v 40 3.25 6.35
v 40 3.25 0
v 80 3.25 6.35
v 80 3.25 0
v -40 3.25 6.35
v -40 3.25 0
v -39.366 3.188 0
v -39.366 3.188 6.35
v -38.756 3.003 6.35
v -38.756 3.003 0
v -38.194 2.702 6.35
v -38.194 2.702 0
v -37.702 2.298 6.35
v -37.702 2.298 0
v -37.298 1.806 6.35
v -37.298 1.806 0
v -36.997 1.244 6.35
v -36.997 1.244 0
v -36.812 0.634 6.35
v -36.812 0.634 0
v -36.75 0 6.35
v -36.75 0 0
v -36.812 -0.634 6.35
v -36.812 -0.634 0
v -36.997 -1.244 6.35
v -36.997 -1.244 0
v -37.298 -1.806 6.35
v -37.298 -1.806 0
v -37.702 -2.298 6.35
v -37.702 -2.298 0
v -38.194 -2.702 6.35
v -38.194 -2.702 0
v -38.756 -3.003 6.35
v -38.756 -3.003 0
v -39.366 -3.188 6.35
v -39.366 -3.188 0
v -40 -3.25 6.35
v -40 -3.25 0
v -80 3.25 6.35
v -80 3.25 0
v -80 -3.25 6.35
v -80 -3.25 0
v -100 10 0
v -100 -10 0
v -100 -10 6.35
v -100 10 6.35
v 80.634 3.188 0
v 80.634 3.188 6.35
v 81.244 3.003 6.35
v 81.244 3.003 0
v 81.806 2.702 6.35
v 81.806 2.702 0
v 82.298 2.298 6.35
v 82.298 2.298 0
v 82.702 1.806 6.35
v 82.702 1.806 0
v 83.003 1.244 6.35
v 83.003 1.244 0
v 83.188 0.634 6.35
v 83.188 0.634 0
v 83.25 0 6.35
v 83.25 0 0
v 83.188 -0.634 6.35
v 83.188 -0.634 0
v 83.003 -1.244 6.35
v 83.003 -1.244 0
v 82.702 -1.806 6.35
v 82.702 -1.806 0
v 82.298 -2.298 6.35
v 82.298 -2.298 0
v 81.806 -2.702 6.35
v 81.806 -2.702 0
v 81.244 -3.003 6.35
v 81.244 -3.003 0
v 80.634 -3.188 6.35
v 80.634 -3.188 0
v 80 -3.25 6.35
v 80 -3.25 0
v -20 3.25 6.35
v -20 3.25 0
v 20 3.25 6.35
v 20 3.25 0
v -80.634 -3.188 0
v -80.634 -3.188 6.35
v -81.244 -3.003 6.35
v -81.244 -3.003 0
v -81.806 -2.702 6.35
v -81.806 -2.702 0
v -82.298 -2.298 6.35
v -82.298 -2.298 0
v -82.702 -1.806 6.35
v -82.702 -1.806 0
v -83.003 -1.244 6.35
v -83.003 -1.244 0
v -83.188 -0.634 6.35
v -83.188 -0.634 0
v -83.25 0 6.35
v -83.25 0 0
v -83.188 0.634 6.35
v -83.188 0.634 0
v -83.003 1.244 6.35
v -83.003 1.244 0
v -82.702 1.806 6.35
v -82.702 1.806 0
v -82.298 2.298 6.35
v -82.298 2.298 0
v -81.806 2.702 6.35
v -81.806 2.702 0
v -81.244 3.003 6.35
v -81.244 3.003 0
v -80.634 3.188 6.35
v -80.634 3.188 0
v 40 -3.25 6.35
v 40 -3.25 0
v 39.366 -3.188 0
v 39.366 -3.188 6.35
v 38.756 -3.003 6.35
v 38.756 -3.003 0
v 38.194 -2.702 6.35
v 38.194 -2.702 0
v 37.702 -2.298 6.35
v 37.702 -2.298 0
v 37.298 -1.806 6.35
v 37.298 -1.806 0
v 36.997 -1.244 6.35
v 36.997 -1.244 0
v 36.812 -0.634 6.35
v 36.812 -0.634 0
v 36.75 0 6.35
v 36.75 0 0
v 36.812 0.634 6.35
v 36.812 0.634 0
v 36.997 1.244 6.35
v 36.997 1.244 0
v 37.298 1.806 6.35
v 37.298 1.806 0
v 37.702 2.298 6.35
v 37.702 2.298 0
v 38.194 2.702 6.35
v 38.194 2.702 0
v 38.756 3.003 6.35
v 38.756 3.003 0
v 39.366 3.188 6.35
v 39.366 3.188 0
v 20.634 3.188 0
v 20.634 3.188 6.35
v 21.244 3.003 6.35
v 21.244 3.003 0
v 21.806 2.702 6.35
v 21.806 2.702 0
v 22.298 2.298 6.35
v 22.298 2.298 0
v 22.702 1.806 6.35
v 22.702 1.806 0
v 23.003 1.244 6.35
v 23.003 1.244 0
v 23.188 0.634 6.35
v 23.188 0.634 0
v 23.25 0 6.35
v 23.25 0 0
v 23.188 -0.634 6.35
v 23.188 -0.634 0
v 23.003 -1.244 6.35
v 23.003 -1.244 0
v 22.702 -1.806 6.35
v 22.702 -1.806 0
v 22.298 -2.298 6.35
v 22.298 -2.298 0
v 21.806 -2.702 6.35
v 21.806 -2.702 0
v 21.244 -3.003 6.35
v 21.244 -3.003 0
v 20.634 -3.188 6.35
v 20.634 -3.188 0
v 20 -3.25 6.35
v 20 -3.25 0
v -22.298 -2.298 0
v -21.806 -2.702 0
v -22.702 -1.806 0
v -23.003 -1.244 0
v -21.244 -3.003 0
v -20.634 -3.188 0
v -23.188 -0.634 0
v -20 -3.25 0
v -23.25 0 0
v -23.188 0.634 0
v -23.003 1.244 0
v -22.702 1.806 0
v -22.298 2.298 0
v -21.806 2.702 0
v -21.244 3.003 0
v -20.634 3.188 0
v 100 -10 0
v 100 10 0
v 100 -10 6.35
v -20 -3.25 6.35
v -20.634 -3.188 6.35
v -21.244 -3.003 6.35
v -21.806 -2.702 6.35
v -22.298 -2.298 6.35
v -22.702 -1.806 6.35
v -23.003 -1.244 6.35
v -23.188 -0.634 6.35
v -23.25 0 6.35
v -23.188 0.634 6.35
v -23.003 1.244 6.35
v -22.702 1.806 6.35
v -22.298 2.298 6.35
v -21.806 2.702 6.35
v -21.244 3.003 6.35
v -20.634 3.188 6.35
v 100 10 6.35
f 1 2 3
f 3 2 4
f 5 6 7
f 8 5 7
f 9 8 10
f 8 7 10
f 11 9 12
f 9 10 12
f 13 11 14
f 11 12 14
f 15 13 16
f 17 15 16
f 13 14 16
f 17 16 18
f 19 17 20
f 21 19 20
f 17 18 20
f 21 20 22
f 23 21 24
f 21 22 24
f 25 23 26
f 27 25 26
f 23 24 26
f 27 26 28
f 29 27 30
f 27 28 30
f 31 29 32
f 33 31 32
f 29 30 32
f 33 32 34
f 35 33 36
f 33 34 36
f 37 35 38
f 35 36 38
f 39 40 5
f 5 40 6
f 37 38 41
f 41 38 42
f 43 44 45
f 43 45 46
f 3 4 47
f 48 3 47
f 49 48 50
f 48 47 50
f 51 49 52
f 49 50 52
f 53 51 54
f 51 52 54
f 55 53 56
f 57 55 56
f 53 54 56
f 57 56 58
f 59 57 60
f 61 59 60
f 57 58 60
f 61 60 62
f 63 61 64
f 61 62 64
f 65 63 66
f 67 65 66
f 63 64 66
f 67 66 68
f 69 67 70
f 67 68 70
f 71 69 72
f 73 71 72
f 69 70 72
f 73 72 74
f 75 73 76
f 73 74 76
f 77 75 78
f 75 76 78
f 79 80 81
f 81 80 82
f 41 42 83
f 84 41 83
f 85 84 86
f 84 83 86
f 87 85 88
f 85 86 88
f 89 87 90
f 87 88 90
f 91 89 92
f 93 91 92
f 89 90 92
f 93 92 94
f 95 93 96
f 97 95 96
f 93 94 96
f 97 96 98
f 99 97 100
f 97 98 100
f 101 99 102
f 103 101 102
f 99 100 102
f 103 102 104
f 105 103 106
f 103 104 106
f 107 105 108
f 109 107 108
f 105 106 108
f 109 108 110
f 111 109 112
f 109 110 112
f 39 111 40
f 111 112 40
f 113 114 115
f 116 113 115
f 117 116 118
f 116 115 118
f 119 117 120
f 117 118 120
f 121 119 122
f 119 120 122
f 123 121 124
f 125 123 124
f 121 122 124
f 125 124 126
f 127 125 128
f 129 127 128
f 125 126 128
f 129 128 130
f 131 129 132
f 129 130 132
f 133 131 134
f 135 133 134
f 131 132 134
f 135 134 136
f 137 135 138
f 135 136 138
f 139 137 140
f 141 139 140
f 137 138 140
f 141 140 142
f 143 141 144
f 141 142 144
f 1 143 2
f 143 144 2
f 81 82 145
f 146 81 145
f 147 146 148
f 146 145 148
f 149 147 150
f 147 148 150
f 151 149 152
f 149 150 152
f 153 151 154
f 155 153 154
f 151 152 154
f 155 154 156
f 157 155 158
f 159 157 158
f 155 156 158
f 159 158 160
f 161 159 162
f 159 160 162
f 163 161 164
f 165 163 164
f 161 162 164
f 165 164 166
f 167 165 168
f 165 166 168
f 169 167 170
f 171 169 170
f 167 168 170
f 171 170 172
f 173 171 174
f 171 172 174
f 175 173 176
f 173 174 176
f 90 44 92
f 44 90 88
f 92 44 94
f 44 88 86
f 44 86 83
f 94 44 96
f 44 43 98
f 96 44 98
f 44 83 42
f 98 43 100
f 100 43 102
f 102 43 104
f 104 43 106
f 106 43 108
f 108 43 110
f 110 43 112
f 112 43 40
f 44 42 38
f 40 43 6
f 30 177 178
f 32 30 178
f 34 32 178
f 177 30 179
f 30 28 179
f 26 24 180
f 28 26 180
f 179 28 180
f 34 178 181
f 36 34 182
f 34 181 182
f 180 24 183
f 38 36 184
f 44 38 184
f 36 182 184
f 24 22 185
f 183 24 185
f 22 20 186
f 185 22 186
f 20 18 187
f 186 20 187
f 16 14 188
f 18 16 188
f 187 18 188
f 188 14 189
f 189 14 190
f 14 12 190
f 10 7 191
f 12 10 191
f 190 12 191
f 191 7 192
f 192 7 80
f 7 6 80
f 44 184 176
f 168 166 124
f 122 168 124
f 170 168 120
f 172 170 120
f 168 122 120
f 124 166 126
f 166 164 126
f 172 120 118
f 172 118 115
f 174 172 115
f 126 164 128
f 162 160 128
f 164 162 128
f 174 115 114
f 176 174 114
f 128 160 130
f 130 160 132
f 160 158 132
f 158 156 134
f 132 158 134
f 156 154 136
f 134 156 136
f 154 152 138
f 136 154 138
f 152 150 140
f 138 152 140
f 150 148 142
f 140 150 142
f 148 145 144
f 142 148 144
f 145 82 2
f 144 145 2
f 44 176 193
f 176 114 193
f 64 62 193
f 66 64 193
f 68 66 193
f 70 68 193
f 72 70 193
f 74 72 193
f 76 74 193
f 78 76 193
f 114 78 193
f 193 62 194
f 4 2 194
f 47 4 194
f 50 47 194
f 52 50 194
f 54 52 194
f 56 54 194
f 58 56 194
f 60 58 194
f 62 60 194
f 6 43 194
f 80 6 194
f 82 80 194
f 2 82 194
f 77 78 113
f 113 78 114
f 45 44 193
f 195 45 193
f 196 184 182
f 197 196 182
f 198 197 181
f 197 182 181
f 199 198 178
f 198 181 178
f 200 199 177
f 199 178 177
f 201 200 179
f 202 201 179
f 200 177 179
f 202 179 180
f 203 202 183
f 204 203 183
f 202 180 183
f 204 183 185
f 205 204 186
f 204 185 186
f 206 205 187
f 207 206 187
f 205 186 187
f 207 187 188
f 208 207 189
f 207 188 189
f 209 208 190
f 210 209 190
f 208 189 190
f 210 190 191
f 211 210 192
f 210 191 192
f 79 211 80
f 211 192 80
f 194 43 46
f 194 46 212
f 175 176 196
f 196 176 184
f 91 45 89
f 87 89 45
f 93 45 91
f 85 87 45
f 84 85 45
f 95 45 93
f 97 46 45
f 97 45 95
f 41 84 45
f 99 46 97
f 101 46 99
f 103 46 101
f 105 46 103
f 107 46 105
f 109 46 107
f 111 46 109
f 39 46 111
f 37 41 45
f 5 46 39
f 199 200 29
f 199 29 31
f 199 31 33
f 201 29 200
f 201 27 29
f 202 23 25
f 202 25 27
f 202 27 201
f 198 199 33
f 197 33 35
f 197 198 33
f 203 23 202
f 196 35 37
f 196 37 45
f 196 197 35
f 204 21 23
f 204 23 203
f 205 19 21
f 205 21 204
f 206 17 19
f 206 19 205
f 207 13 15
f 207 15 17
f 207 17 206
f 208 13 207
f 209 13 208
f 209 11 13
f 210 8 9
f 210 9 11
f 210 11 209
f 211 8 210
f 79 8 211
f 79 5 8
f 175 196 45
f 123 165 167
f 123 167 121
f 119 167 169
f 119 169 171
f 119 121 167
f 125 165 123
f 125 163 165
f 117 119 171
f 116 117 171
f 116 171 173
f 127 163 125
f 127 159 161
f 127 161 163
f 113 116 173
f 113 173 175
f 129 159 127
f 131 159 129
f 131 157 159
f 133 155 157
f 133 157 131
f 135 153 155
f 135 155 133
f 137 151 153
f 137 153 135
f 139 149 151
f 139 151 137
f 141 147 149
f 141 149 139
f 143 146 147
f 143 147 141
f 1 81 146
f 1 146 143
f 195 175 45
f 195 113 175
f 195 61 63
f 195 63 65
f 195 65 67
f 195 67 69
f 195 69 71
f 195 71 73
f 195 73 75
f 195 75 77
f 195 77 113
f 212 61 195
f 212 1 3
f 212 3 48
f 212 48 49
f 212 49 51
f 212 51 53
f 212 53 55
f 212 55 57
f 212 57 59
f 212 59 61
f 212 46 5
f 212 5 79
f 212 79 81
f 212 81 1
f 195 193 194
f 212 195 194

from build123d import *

# Parameters (mm, degrees)
F0_W     = 200
F0_H     = 20
F1_DEPTH = 6.35


# Not quite as in the source:
# - a length typed as a fraction of an inch, garbled in the dataset ("3 / 203.2 mm" for 3/8 in), is restored


with BuildPart() as f1:
    # F0 (on Top) → F1 (new body)
    with BuildSketch(Plane.XY):
        Rectangle(F0_W, F0_H)
        with BuildLine():
            Line((-80, 3.25), (-40, 3.25))
            ThreePointArc((-40, 3.25), (-36.75, 0), (-40, -3.25))
            Line((-40, -3.25), (-80, -3.25))
            ThreePointArc((-80, -3.25), (-83.25, 0), (-80, 3.25))
        make_face(mode=Mode.SUBTRACT)
        with BuildLine():
            Line((-20, 3.25), (20, 3.25))
            ThreePointArc((20, 3.25), (23.25, 0), (20, -3.25))
            Line((20, -3.25), (-20, -3.25))
            ThreePointArc((-20, -3.25), (-23.25, 0), (-20, 3.25))
        make_face(mode=Mode.SUBTRACT)
        with BuildLine():
            Line((80, -3.25), (40, -3.25))
            ThreePointArc((40, -3.25), (36.75, 0), (40, 3.25))
            Line((40, 3.25), (80, 3.25))
            ThreePointArc((80, 3.25), (83.25, 0), (80, -3.25))
        make_face(mode=Mode.SUBTRACT)
    extrude(amount=F1_DEPTH)


solid = f1.part
